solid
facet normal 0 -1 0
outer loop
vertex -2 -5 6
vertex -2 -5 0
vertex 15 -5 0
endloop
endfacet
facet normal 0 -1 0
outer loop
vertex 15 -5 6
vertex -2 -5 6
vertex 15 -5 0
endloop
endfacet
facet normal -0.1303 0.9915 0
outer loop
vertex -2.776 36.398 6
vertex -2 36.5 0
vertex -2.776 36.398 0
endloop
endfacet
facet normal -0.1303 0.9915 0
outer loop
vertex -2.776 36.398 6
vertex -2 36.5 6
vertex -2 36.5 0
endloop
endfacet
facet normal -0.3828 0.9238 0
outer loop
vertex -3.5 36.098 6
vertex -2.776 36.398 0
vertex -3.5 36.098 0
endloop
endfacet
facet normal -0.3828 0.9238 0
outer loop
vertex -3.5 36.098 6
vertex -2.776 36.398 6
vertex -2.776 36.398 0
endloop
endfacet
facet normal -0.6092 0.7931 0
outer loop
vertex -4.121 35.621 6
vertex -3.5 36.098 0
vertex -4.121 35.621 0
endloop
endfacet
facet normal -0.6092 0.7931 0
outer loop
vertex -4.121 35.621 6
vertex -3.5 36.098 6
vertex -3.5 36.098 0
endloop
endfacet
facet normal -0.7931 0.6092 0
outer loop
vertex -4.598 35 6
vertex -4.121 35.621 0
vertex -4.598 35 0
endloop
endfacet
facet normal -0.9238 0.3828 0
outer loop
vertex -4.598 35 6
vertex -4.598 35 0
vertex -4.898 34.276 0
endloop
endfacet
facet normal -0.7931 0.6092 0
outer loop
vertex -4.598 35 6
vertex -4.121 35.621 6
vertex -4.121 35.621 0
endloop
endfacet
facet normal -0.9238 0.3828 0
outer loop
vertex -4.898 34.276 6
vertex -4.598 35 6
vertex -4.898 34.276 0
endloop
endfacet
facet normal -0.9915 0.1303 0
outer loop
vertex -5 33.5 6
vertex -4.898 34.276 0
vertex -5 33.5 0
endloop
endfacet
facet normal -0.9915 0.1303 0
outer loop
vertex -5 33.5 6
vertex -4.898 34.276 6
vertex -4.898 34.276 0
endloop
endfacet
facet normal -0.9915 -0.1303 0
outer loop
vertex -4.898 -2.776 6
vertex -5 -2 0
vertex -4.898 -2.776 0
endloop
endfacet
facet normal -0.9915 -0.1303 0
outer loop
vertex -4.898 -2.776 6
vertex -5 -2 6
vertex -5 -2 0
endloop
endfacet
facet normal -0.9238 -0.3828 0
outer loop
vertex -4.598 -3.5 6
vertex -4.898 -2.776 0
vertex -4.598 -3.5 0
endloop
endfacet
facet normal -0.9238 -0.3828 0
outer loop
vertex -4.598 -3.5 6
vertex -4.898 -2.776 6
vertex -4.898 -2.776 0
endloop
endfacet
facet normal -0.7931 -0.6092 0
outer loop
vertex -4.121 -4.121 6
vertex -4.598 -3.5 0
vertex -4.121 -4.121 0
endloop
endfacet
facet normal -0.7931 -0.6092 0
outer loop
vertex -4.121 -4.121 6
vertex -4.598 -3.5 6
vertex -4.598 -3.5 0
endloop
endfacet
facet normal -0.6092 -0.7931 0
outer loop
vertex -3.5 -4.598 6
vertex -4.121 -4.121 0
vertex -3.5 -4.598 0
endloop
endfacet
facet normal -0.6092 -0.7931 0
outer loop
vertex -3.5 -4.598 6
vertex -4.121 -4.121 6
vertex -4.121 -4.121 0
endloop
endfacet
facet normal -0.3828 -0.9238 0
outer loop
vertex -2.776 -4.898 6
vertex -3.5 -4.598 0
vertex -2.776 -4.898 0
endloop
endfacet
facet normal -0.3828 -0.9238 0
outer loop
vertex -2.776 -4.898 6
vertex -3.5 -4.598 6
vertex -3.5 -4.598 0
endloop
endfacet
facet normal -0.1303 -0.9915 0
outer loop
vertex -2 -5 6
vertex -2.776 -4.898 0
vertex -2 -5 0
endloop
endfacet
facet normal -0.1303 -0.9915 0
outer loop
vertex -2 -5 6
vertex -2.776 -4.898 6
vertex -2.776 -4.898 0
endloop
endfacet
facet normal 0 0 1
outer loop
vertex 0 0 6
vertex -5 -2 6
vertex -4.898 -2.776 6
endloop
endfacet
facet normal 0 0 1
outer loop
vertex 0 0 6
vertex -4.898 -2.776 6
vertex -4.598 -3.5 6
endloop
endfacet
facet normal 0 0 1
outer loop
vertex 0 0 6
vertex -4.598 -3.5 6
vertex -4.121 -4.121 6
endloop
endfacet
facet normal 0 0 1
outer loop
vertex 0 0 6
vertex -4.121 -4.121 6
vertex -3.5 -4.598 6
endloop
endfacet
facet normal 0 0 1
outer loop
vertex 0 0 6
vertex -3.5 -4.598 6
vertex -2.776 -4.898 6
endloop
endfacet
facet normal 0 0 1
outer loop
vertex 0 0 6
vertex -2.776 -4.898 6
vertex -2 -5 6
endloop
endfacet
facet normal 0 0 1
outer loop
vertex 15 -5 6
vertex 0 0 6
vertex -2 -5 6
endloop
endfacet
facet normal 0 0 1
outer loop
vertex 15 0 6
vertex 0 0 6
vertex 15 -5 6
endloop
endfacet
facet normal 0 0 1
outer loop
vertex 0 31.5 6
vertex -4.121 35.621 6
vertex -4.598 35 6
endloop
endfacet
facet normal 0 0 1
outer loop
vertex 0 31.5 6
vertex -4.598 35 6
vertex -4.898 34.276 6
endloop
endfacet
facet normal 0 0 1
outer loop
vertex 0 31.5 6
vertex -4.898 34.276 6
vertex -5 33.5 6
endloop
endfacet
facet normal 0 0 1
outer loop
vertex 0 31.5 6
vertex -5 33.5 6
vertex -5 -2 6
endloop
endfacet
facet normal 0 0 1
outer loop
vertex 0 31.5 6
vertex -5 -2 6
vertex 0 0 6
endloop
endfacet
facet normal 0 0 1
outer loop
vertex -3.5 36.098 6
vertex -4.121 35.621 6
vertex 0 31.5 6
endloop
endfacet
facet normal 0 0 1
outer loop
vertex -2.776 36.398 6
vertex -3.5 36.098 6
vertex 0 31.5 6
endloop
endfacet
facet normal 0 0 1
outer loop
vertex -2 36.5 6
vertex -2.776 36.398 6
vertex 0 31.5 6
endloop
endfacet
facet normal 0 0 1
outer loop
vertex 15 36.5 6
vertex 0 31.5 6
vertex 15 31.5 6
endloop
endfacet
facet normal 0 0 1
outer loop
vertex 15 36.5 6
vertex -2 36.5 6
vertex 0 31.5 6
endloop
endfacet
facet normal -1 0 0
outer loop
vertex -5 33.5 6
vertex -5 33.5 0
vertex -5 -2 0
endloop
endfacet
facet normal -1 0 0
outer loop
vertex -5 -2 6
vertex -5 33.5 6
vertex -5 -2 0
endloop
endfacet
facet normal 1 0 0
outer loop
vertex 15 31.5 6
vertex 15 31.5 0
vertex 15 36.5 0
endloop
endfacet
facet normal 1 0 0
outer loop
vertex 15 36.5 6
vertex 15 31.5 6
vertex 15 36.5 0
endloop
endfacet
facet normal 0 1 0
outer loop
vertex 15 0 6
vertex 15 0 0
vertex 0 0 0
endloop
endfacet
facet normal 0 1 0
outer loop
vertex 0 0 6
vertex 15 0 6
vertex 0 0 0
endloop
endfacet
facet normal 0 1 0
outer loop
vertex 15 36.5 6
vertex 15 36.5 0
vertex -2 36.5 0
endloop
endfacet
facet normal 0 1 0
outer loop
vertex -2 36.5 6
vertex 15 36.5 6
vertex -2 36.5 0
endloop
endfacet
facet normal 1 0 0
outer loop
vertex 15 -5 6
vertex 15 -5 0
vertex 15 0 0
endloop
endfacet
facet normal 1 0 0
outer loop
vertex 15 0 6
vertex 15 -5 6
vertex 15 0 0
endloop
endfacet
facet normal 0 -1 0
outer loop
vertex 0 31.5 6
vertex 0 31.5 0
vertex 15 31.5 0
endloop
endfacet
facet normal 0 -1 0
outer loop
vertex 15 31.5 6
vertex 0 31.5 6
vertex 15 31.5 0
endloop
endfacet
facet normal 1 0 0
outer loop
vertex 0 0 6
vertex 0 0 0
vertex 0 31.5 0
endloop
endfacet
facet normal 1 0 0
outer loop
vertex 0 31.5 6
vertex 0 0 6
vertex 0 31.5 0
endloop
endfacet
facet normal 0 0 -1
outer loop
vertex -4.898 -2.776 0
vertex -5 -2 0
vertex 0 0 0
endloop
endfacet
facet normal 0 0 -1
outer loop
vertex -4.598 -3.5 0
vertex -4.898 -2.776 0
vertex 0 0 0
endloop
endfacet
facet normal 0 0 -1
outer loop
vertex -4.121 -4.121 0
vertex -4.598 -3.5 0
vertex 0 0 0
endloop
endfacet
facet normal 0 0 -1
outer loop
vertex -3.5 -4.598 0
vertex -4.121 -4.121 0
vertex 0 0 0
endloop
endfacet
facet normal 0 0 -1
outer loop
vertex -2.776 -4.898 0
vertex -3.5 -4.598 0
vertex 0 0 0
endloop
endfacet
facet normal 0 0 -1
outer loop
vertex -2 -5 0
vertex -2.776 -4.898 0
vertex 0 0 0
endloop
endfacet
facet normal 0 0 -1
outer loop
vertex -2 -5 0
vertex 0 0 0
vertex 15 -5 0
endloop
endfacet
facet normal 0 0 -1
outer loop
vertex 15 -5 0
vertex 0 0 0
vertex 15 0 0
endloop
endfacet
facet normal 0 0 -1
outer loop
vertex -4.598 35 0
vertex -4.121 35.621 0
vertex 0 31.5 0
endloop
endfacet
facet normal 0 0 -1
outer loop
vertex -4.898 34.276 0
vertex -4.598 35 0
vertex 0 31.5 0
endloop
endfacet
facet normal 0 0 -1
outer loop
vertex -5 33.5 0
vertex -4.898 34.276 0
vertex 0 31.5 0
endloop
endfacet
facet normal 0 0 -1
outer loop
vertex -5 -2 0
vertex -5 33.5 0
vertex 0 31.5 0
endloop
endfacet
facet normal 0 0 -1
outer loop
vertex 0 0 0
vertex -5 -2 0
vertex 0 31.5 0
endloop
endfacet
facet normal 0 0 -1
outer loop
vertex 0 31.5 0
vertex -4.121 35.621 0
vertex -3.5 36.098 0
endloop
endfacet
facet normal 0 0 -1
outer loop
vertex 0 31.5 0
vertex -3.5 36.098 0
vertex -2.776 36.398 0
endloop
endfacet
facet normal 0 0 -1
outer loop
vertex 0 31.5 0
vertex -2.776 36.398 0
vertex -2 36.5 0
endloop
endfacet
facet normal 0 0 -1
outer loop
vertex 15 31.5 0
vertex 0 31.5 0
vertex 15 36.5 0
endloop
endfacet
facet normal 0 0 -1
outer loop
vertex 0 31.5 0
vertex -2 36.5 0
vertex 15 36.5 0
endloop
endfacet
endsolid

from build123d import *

# Parameters (mm, degrees)
F1_DEPTH = 6
F2_R     = 3


with BuildPart() as f1:
    # F0 (on Top) → F1 (new body)
    with BuildSketch(Plane.XY):
        Polygon((15, 0), (0, 0), (0, 31.5), (15, 31.5), (15, 36.5), (-5, 36.5), (-5, 0), (-5, -5), (15, -5), align=None)
    extrude(amount=F1_DEPTH)

    # F2
    f2_edges = [f1.edges().sort_by_distance(p)[0] for p in [
        (-5, 36.5, 3),
        (-5, -5, 3),
    ]]
    fillet(f2_edges, radius=F2_R)


solid = f1.part
